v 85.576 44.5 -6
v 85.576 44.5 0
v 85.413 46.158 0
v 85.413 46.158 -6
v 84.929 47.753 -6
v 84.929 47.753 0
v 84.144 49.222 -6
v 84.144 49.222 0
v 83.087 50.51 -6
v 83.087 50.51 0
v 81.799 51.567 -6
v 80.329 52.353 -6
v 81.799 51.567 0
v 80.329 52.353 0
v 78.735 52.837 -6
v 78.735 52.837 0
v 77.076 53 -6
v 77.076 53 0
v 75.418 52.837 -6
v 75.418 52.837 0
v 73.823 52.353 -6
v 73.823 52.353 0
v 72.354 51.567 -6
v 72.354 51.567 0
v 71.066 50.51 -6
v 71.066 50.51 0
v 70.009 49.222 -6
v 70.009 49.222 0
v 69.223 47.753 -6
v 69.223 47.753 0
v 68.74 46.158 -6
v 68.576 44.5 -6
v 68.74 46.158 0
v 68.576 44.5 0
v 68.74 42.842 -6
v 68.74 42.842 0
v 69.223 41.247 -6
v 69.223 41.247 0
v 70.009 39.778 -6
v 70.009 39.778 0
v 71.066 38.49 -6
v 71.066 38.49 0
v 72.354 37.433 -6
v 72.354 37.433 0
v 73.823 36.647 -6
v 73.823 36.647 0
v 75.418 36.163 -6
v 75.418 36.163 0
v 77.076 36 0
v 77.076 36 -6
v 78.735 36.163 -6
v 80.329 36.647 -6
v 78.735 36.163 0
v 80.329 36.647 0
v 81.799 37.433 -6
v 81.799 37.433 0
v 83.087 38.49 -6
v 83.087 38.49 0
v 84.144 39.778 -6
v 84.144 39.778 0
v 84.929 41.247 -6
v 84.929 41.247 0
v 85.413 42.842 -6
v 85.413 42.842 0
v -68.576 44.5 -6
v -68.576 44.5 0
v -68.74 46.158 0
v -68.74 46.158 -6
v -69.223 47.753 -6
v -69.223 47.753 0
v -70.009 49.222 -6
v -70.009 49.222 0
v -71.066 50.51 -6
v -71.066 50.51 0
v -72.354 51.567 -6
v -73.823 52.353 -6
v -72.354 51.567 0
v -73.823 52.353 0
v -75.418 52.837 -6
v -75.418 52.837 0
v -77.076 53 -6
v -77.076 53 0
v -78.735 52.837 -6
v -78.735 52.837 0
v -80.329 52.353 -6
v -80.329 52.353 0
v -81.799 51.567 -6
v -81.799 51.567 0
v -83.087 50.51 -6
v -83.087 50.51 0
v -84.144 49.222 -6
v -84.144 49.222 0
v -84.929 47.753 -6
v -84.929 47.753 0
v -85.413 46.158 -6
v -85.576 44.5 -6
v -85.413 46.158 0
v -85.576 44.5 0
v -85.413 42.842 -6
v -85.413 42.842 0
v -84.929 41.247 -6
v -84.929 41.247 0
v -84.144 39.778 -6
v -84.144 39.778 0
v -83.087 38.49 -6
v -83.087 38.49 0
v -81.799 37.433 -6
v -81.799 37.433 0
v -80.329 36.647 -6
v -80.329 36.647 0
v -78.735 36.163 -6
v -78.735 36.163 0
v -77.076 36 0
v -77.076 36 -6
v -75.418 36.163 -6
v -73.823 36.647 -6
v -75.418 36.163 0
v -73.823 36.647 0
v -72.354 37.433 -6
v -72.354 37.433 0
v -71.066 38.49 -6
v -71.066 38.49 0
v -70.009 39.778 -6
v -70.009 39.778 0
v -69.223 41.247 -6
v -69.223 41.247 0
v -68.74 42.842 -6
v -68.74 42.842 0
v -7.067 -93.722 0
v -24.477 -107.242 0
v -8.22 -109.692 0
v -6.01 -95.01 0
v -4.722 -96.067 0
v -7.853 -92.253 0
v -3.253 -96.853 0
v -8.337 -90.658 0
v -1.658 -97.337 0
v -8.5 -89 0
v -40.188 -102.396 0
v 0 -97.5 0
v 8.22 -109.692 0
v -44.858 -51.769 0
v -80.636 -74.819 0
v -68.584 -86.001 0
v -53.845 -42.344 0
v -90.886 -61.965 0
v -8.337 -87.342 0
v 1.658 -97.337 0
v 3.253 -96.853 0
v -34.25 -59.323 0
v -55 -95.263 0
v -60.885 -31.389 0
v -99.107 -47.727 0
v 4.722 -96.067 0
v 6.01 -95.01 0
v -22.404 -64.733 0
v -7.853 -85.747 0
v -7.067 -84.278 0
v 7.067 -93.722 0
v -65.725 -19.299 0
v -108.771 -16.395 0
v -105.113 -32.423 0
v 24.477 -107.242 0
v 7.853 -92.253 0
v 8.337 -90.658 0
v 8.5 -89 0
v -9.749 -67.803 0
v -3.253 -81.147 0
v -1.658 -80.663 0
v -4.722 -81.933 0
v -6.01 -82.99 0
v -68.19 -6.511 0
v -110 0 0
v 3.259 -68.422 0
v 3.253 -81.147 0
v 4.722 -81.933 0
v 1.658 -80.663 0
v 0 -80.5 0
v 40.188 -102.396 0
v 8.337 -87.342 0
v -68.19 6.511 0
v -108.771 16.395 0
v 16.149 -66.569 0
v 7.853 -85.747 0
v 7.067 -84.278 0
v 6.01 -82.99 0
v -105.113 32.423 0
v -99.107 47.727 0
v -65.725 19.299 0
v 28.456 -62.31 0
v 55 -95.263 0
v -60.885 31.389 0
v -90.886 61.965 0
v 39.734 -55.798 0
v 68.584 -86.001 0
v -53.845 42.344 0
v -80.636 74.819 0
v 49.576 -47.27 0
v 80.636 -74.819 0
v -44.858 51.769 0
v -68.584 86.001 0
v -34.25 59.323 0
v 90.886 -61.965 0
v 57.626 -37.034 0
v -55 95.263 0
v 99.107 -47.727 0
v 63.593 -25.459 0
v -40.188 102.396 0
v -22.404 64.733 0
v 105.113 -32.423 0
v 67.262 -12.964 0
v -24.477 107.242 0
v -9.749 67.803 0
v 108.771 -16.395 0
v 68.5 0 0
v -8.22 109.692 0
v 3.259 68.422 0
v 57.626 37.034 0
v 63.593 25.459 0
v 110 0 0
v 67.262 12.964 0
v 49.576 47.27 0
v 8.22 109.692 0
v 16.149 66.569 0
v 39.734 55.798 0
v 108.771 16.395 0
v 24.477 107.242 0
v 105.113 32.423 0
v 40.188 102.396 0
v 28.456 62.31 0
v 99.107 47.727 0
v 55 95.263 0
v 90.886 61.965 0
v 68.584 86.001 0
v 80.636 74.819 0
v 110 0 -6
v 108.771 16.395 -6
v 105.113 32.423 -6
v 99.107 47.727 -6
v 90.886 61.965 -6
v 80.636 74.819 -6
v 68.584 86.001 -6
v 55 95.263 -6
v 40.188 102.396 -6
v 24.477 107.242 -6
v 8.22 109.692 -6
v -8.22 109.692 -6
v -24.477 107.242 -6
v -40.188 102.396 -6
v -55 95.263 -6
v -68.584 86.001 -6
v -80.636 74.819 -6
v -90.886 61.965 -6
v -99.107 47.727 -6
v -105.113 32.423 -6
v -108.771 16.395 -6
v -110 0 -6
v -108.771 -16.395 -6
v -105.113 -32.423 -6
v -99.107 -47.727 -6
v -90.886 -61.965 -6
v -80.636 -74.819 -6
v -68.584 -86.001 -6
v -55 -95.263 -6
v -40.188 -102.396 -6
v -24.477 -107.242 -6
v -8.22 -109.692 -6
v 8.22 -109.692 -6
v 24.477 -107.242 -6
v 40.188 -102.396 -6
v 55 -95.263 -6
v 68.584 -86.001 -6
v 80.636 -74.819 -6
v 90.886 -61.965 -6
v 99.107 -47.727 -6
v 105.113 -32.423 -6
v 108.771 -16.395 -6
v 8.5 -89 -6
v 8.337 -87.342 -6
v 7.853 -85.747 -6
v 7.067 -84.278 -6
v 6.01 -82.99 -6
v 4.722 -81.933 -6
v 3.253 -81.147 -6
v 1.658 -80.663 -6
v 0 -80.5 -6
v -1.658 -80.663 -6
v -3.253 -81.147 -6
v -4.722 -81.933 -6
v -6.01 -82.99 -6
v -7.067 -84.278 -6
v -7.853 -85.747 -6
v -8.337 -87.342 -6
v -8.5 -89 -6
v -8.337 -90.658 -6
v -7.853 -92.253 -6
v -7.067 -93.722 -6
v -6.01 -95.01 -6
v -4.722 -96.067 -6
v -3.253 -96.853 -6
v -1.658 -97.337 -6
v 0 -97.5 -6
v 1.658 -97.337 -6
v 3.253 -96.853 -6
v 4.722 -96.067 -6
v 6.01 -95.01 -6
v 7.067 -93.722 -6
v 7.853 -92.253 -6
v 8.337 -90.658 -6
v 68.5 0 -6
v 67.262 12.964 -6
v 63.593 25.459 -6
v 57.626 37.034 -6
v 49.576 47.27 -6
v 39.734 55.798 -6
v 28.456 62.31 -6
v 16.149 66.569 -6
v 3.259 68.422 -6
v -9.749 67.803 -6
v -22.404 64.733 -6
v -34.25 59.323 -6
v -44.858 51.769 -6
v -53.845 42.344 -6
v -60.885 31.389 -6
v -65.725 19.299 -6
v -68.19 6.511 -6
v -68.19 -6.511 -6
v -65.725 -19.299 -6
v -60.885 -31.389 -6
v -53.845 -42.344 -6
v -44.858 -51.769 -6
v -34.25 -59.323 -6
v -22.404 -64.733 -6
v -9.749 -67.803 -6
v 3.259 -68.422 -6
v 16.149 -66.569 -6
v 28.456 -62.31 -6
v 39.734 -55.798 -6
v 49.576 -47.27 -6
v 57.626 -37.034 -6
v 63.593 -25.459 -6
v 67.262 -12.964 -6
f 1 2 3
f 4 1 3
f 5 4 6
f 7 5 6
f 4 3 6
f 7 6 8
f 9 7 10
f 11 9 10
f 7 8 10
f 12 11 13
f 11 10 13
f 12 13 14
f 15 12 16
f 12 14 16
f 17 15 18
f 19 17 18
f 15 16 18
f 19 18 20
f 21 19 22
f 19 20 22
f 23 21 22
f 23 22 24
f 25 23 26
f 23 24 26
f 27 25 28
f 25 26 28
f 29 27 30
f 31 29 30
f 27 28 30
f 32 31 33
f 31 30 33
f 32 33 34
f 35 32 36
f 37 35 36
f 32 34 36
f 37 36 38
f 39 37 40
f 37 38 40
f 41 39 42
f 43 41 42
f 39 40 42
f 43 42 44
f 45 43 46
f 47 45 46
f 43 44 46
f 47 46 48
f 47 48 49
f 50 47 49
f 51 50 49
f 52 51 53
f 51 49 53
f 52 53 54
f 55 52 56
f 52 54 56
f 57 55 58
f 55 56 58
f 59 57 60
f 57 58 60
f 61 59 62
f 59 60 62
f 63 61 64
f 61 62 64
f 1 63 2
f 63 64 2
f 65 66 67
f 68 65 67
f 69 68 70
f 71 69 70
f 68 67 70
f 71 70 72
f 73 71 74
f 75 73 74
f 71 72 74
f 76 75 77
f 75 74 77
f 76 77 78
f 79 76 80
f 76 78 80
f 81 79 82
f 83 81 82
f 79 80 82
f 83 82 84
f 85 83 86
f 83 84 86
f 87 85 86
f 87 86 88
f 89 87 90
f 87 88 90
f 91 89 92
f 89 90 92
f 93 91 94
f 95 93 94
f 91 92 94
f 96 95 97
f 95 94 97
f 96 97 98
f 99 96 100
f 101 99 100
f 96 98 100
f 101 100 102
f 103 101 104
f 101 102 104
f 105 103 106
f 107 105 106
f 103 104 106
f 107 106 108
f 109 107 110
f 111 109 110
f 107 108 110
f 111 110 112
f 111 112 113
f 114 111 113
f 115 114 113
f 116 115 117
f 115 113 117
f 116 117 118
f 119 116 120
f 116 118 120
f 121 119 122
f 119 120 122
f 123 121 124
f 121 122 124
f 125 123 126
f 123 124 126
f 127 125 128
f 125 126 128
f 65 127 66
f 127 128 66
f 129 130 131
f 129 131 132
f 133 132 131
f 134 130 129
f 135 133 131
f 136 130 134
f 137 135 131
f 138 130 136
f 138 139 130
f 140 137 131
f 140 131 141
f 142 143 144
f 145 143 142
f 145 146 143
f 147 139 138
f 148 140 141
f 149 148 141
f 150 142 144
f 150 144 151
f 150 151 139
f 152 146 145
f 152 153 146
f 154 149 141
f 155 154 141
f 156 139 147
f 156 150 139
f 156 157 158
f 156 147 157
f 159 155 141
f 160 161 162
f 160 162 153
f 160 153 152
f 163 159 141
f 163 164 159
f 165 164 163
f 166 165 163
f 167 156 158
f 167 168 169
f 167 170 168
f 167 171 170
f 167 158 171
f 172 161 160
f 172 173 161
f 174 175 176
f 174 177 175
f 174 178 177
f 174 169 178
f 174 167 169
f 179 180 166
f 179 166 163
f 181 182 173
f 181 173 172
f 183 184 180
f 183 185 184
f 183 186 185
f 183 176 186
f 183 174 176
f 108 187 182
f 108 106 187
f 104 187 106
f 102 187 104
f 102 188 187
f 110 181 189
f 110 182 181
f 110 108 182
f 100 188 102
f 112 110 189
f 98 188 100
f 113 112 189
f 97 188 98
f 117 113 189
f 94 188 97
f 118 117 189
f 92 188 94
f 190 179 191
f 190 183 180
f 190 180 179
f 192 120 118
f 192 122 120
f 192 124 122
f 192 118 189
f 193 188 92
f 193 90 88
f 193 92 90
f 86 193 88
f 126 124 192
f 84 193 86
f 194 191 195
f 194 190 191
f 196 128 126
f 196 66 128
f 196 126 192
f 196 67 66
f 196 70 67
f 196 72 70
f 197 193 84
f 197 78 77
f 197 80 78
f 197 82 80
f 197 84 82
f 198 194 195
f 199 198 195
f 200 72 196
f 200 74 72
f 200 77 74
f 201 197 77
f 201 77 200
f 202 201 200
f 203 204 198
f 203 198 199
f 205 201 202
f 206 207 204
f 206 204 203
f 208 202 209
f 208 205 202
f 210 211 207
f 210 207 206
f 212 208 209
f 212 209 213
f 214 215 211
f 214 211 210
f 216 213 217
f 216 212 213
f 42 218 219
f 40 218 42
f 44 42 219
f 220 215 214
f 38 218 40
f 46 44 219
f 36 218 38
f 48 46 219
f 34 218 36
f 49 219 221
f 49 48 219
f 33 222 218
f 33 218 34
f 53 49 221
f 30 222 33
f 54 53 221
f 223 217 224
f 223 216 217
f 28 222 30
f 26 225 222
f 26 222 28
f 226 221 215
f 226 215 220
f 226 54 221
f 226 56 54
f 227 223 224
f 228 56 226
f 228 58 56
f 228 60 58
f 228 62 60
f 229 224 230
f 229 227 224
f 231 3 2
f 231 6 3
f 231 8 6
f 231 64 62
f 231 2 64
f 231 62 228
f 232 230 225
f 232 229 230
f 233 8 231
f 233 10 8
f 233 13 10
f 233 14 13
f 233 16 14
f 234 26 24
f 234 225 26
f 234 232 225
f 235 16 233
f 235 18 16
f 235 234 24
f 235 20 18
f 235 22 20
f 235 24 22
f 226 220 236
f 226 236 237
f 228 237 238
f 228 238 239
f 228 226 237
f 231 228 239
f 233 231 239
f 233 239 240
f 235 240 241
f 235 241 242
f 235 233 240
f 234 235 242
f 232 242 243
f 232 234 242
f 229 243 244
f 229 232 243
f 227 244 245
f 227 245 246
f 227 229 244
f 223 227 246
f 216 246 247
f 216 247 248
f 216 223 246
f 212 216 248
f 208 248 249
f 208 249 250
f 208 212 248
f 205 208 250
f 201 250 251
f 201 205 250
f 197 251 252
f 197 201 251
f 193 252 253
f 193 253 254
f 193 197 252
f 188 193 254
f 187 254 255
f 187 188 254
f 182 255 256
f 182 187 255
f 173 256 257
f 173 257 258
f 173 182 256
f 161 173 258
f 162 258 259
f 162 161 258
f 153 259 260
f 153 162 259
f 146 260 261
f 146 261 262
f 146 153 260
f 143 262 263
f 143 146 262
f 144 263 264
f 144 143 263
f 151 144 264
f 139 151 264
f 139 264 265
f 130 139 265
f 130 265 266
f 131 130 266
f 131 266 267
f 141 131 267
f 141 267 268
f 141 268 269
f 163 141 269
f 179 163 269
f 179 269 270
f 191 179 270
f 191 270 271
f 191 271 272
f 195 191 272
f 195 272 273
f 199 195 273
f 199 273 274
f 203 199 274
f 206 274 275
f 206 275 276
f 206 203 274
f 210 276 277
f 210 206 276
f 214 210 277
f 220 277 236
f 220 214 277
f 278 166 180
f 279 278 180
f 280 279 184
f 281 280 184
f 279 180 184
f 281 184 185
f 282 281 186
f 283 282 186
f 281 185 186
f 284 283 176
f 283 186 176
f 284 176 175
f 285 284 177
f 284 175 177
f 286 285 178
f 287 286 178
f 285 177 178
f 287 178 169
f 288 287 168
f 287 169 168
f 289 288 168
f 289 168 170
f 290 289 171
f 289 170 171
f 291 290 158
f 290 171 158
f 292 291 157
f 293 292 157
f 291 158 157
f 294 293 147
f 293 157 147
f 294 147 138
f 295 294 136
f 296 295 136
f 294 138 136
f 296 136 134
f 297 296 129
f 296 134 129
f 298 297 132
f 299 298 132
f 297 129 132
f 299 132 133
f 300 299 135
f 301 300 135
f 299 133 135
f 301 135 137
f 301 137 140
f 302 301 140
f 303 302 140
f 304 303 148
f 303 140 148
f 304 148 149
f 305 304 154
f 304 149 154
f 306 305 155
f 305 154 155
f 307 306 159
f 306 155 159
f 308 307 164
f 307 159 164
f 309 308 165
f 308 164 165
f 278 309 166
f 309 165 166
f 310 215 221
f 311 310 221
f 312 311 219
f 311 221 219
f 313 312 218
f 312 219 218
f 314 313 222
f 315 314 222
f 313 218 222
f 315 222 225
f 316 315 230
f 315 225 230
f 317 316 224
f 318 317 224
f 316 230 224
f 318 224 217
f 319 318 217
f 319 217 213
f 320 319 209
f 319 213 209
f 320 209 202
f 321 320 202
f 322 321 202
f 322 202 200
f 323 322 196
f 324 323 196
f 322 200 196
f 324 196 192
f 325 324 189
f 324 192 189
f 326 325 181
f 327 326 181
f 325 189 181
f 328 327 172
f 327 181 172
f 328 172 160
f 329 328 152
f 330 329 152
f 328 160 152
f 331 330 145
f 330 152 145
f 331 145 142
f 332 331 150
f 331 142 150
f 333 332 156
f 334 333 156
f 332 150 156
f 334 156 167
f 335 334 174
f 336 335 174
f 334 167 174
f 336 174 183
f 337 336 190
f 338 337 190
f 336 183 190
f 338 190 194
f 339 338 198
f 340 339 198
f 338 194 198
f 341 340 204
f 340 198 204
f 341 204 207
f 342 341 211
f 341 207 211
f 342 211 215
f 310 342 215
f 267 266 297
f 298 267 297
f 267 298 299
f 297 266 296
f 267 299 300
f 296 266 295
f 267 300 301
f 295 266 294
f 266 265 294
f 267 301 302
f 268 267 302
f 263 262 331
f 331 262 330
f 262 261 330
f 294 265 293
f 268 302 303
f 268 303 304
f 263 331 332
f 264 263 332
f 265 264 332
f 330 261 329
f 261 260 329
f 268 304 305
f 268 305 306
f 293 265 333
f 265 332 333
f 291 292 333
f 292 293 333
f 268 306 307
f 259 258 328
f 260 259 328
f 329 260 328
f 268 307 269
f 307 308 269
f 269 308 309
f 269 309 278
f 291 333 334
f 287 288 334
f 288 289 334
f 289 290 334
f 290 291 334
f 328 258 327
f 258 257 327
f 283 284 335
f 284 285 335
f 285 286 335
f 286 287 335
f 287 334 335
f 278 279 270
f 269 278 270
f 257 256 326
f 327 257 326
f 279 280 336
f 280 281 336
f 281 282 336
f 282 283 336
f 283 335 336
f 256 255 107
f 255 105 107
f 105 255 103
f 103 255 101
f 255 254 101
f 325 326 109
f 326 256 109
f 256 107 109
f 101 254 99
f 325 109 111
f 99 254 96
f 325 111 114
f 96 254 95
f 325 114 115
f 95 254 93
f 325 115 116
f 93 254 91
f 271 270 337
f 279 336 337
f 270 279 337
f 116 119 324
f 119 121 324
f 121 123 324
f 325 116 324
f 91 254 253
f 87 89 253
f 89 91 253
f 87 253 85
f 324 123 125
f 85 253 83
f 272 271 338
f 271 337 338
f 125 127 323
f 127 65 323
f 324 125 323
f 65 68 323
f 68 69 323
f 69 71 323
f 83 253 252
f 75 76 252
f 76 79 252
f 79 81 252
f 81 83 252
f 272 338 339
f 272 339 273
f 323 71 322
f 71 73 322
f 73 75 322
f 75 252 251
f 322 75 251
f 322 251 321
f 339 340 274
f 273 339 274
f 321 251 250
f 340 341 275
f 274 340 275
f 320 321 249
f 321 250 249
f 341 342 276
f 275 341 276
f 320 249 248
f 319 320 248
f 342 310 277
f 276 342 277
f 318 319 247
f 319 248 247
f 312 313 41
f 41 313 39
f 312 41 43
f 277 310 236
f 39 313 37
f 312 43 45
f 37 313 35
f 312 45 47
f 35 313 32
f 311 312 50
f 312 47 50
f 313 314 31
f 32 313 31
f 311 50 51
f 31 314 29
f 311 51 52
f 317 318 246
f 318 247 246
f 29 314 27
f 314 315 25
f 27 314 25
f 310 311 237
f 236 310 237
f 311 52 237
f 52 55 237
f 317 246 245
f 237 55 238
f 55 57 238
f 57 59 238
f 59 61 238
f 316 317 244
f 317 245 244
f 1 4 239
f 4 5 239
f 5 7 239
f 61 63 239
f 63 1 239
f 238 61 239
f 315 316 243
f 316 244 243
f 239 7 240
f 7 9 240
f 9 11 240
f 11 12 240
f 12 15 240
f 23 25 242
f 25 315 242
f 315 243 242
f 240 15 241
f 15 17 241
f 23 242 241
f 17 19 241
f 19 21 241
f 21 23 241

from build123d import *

# Parameters (mm, degrees)
SKETCH_1_R             = 110
SKETCH_1_R_2           = 68.5
SKETCH_1_R_3           = 8.5
SM_BASE_FLANGE_1_DEPTH = 6


# Sheet-metal steps are written as plain solids
with BuildPart() as part:
    # Sketch 1 → Базовая кромка1 (new body)
    with BuildSketch(Plane.XY):
        Circle(SKETCH_1_R)
        Circle(SKETCH_1_R_2, mode=Mode.SUBTRACT)
        with Locations((77.076260937, 44.5)):
            Circle(SKETCH_1_R_3, mode=Mode.SUBTRACT)
        with Locations((0, -89)):
            Circle(SKETCH_1_R_3, mode=Mode.SUBTRACT)
        with Locations((-77.076260937, 44.5)):
            Circle(SKETCH_1_R_3, mode=Mode.SUBTRACT)
    extrude(amount=-SM_BASE_FLANGE_1_DEPTH)


solid = part.part
